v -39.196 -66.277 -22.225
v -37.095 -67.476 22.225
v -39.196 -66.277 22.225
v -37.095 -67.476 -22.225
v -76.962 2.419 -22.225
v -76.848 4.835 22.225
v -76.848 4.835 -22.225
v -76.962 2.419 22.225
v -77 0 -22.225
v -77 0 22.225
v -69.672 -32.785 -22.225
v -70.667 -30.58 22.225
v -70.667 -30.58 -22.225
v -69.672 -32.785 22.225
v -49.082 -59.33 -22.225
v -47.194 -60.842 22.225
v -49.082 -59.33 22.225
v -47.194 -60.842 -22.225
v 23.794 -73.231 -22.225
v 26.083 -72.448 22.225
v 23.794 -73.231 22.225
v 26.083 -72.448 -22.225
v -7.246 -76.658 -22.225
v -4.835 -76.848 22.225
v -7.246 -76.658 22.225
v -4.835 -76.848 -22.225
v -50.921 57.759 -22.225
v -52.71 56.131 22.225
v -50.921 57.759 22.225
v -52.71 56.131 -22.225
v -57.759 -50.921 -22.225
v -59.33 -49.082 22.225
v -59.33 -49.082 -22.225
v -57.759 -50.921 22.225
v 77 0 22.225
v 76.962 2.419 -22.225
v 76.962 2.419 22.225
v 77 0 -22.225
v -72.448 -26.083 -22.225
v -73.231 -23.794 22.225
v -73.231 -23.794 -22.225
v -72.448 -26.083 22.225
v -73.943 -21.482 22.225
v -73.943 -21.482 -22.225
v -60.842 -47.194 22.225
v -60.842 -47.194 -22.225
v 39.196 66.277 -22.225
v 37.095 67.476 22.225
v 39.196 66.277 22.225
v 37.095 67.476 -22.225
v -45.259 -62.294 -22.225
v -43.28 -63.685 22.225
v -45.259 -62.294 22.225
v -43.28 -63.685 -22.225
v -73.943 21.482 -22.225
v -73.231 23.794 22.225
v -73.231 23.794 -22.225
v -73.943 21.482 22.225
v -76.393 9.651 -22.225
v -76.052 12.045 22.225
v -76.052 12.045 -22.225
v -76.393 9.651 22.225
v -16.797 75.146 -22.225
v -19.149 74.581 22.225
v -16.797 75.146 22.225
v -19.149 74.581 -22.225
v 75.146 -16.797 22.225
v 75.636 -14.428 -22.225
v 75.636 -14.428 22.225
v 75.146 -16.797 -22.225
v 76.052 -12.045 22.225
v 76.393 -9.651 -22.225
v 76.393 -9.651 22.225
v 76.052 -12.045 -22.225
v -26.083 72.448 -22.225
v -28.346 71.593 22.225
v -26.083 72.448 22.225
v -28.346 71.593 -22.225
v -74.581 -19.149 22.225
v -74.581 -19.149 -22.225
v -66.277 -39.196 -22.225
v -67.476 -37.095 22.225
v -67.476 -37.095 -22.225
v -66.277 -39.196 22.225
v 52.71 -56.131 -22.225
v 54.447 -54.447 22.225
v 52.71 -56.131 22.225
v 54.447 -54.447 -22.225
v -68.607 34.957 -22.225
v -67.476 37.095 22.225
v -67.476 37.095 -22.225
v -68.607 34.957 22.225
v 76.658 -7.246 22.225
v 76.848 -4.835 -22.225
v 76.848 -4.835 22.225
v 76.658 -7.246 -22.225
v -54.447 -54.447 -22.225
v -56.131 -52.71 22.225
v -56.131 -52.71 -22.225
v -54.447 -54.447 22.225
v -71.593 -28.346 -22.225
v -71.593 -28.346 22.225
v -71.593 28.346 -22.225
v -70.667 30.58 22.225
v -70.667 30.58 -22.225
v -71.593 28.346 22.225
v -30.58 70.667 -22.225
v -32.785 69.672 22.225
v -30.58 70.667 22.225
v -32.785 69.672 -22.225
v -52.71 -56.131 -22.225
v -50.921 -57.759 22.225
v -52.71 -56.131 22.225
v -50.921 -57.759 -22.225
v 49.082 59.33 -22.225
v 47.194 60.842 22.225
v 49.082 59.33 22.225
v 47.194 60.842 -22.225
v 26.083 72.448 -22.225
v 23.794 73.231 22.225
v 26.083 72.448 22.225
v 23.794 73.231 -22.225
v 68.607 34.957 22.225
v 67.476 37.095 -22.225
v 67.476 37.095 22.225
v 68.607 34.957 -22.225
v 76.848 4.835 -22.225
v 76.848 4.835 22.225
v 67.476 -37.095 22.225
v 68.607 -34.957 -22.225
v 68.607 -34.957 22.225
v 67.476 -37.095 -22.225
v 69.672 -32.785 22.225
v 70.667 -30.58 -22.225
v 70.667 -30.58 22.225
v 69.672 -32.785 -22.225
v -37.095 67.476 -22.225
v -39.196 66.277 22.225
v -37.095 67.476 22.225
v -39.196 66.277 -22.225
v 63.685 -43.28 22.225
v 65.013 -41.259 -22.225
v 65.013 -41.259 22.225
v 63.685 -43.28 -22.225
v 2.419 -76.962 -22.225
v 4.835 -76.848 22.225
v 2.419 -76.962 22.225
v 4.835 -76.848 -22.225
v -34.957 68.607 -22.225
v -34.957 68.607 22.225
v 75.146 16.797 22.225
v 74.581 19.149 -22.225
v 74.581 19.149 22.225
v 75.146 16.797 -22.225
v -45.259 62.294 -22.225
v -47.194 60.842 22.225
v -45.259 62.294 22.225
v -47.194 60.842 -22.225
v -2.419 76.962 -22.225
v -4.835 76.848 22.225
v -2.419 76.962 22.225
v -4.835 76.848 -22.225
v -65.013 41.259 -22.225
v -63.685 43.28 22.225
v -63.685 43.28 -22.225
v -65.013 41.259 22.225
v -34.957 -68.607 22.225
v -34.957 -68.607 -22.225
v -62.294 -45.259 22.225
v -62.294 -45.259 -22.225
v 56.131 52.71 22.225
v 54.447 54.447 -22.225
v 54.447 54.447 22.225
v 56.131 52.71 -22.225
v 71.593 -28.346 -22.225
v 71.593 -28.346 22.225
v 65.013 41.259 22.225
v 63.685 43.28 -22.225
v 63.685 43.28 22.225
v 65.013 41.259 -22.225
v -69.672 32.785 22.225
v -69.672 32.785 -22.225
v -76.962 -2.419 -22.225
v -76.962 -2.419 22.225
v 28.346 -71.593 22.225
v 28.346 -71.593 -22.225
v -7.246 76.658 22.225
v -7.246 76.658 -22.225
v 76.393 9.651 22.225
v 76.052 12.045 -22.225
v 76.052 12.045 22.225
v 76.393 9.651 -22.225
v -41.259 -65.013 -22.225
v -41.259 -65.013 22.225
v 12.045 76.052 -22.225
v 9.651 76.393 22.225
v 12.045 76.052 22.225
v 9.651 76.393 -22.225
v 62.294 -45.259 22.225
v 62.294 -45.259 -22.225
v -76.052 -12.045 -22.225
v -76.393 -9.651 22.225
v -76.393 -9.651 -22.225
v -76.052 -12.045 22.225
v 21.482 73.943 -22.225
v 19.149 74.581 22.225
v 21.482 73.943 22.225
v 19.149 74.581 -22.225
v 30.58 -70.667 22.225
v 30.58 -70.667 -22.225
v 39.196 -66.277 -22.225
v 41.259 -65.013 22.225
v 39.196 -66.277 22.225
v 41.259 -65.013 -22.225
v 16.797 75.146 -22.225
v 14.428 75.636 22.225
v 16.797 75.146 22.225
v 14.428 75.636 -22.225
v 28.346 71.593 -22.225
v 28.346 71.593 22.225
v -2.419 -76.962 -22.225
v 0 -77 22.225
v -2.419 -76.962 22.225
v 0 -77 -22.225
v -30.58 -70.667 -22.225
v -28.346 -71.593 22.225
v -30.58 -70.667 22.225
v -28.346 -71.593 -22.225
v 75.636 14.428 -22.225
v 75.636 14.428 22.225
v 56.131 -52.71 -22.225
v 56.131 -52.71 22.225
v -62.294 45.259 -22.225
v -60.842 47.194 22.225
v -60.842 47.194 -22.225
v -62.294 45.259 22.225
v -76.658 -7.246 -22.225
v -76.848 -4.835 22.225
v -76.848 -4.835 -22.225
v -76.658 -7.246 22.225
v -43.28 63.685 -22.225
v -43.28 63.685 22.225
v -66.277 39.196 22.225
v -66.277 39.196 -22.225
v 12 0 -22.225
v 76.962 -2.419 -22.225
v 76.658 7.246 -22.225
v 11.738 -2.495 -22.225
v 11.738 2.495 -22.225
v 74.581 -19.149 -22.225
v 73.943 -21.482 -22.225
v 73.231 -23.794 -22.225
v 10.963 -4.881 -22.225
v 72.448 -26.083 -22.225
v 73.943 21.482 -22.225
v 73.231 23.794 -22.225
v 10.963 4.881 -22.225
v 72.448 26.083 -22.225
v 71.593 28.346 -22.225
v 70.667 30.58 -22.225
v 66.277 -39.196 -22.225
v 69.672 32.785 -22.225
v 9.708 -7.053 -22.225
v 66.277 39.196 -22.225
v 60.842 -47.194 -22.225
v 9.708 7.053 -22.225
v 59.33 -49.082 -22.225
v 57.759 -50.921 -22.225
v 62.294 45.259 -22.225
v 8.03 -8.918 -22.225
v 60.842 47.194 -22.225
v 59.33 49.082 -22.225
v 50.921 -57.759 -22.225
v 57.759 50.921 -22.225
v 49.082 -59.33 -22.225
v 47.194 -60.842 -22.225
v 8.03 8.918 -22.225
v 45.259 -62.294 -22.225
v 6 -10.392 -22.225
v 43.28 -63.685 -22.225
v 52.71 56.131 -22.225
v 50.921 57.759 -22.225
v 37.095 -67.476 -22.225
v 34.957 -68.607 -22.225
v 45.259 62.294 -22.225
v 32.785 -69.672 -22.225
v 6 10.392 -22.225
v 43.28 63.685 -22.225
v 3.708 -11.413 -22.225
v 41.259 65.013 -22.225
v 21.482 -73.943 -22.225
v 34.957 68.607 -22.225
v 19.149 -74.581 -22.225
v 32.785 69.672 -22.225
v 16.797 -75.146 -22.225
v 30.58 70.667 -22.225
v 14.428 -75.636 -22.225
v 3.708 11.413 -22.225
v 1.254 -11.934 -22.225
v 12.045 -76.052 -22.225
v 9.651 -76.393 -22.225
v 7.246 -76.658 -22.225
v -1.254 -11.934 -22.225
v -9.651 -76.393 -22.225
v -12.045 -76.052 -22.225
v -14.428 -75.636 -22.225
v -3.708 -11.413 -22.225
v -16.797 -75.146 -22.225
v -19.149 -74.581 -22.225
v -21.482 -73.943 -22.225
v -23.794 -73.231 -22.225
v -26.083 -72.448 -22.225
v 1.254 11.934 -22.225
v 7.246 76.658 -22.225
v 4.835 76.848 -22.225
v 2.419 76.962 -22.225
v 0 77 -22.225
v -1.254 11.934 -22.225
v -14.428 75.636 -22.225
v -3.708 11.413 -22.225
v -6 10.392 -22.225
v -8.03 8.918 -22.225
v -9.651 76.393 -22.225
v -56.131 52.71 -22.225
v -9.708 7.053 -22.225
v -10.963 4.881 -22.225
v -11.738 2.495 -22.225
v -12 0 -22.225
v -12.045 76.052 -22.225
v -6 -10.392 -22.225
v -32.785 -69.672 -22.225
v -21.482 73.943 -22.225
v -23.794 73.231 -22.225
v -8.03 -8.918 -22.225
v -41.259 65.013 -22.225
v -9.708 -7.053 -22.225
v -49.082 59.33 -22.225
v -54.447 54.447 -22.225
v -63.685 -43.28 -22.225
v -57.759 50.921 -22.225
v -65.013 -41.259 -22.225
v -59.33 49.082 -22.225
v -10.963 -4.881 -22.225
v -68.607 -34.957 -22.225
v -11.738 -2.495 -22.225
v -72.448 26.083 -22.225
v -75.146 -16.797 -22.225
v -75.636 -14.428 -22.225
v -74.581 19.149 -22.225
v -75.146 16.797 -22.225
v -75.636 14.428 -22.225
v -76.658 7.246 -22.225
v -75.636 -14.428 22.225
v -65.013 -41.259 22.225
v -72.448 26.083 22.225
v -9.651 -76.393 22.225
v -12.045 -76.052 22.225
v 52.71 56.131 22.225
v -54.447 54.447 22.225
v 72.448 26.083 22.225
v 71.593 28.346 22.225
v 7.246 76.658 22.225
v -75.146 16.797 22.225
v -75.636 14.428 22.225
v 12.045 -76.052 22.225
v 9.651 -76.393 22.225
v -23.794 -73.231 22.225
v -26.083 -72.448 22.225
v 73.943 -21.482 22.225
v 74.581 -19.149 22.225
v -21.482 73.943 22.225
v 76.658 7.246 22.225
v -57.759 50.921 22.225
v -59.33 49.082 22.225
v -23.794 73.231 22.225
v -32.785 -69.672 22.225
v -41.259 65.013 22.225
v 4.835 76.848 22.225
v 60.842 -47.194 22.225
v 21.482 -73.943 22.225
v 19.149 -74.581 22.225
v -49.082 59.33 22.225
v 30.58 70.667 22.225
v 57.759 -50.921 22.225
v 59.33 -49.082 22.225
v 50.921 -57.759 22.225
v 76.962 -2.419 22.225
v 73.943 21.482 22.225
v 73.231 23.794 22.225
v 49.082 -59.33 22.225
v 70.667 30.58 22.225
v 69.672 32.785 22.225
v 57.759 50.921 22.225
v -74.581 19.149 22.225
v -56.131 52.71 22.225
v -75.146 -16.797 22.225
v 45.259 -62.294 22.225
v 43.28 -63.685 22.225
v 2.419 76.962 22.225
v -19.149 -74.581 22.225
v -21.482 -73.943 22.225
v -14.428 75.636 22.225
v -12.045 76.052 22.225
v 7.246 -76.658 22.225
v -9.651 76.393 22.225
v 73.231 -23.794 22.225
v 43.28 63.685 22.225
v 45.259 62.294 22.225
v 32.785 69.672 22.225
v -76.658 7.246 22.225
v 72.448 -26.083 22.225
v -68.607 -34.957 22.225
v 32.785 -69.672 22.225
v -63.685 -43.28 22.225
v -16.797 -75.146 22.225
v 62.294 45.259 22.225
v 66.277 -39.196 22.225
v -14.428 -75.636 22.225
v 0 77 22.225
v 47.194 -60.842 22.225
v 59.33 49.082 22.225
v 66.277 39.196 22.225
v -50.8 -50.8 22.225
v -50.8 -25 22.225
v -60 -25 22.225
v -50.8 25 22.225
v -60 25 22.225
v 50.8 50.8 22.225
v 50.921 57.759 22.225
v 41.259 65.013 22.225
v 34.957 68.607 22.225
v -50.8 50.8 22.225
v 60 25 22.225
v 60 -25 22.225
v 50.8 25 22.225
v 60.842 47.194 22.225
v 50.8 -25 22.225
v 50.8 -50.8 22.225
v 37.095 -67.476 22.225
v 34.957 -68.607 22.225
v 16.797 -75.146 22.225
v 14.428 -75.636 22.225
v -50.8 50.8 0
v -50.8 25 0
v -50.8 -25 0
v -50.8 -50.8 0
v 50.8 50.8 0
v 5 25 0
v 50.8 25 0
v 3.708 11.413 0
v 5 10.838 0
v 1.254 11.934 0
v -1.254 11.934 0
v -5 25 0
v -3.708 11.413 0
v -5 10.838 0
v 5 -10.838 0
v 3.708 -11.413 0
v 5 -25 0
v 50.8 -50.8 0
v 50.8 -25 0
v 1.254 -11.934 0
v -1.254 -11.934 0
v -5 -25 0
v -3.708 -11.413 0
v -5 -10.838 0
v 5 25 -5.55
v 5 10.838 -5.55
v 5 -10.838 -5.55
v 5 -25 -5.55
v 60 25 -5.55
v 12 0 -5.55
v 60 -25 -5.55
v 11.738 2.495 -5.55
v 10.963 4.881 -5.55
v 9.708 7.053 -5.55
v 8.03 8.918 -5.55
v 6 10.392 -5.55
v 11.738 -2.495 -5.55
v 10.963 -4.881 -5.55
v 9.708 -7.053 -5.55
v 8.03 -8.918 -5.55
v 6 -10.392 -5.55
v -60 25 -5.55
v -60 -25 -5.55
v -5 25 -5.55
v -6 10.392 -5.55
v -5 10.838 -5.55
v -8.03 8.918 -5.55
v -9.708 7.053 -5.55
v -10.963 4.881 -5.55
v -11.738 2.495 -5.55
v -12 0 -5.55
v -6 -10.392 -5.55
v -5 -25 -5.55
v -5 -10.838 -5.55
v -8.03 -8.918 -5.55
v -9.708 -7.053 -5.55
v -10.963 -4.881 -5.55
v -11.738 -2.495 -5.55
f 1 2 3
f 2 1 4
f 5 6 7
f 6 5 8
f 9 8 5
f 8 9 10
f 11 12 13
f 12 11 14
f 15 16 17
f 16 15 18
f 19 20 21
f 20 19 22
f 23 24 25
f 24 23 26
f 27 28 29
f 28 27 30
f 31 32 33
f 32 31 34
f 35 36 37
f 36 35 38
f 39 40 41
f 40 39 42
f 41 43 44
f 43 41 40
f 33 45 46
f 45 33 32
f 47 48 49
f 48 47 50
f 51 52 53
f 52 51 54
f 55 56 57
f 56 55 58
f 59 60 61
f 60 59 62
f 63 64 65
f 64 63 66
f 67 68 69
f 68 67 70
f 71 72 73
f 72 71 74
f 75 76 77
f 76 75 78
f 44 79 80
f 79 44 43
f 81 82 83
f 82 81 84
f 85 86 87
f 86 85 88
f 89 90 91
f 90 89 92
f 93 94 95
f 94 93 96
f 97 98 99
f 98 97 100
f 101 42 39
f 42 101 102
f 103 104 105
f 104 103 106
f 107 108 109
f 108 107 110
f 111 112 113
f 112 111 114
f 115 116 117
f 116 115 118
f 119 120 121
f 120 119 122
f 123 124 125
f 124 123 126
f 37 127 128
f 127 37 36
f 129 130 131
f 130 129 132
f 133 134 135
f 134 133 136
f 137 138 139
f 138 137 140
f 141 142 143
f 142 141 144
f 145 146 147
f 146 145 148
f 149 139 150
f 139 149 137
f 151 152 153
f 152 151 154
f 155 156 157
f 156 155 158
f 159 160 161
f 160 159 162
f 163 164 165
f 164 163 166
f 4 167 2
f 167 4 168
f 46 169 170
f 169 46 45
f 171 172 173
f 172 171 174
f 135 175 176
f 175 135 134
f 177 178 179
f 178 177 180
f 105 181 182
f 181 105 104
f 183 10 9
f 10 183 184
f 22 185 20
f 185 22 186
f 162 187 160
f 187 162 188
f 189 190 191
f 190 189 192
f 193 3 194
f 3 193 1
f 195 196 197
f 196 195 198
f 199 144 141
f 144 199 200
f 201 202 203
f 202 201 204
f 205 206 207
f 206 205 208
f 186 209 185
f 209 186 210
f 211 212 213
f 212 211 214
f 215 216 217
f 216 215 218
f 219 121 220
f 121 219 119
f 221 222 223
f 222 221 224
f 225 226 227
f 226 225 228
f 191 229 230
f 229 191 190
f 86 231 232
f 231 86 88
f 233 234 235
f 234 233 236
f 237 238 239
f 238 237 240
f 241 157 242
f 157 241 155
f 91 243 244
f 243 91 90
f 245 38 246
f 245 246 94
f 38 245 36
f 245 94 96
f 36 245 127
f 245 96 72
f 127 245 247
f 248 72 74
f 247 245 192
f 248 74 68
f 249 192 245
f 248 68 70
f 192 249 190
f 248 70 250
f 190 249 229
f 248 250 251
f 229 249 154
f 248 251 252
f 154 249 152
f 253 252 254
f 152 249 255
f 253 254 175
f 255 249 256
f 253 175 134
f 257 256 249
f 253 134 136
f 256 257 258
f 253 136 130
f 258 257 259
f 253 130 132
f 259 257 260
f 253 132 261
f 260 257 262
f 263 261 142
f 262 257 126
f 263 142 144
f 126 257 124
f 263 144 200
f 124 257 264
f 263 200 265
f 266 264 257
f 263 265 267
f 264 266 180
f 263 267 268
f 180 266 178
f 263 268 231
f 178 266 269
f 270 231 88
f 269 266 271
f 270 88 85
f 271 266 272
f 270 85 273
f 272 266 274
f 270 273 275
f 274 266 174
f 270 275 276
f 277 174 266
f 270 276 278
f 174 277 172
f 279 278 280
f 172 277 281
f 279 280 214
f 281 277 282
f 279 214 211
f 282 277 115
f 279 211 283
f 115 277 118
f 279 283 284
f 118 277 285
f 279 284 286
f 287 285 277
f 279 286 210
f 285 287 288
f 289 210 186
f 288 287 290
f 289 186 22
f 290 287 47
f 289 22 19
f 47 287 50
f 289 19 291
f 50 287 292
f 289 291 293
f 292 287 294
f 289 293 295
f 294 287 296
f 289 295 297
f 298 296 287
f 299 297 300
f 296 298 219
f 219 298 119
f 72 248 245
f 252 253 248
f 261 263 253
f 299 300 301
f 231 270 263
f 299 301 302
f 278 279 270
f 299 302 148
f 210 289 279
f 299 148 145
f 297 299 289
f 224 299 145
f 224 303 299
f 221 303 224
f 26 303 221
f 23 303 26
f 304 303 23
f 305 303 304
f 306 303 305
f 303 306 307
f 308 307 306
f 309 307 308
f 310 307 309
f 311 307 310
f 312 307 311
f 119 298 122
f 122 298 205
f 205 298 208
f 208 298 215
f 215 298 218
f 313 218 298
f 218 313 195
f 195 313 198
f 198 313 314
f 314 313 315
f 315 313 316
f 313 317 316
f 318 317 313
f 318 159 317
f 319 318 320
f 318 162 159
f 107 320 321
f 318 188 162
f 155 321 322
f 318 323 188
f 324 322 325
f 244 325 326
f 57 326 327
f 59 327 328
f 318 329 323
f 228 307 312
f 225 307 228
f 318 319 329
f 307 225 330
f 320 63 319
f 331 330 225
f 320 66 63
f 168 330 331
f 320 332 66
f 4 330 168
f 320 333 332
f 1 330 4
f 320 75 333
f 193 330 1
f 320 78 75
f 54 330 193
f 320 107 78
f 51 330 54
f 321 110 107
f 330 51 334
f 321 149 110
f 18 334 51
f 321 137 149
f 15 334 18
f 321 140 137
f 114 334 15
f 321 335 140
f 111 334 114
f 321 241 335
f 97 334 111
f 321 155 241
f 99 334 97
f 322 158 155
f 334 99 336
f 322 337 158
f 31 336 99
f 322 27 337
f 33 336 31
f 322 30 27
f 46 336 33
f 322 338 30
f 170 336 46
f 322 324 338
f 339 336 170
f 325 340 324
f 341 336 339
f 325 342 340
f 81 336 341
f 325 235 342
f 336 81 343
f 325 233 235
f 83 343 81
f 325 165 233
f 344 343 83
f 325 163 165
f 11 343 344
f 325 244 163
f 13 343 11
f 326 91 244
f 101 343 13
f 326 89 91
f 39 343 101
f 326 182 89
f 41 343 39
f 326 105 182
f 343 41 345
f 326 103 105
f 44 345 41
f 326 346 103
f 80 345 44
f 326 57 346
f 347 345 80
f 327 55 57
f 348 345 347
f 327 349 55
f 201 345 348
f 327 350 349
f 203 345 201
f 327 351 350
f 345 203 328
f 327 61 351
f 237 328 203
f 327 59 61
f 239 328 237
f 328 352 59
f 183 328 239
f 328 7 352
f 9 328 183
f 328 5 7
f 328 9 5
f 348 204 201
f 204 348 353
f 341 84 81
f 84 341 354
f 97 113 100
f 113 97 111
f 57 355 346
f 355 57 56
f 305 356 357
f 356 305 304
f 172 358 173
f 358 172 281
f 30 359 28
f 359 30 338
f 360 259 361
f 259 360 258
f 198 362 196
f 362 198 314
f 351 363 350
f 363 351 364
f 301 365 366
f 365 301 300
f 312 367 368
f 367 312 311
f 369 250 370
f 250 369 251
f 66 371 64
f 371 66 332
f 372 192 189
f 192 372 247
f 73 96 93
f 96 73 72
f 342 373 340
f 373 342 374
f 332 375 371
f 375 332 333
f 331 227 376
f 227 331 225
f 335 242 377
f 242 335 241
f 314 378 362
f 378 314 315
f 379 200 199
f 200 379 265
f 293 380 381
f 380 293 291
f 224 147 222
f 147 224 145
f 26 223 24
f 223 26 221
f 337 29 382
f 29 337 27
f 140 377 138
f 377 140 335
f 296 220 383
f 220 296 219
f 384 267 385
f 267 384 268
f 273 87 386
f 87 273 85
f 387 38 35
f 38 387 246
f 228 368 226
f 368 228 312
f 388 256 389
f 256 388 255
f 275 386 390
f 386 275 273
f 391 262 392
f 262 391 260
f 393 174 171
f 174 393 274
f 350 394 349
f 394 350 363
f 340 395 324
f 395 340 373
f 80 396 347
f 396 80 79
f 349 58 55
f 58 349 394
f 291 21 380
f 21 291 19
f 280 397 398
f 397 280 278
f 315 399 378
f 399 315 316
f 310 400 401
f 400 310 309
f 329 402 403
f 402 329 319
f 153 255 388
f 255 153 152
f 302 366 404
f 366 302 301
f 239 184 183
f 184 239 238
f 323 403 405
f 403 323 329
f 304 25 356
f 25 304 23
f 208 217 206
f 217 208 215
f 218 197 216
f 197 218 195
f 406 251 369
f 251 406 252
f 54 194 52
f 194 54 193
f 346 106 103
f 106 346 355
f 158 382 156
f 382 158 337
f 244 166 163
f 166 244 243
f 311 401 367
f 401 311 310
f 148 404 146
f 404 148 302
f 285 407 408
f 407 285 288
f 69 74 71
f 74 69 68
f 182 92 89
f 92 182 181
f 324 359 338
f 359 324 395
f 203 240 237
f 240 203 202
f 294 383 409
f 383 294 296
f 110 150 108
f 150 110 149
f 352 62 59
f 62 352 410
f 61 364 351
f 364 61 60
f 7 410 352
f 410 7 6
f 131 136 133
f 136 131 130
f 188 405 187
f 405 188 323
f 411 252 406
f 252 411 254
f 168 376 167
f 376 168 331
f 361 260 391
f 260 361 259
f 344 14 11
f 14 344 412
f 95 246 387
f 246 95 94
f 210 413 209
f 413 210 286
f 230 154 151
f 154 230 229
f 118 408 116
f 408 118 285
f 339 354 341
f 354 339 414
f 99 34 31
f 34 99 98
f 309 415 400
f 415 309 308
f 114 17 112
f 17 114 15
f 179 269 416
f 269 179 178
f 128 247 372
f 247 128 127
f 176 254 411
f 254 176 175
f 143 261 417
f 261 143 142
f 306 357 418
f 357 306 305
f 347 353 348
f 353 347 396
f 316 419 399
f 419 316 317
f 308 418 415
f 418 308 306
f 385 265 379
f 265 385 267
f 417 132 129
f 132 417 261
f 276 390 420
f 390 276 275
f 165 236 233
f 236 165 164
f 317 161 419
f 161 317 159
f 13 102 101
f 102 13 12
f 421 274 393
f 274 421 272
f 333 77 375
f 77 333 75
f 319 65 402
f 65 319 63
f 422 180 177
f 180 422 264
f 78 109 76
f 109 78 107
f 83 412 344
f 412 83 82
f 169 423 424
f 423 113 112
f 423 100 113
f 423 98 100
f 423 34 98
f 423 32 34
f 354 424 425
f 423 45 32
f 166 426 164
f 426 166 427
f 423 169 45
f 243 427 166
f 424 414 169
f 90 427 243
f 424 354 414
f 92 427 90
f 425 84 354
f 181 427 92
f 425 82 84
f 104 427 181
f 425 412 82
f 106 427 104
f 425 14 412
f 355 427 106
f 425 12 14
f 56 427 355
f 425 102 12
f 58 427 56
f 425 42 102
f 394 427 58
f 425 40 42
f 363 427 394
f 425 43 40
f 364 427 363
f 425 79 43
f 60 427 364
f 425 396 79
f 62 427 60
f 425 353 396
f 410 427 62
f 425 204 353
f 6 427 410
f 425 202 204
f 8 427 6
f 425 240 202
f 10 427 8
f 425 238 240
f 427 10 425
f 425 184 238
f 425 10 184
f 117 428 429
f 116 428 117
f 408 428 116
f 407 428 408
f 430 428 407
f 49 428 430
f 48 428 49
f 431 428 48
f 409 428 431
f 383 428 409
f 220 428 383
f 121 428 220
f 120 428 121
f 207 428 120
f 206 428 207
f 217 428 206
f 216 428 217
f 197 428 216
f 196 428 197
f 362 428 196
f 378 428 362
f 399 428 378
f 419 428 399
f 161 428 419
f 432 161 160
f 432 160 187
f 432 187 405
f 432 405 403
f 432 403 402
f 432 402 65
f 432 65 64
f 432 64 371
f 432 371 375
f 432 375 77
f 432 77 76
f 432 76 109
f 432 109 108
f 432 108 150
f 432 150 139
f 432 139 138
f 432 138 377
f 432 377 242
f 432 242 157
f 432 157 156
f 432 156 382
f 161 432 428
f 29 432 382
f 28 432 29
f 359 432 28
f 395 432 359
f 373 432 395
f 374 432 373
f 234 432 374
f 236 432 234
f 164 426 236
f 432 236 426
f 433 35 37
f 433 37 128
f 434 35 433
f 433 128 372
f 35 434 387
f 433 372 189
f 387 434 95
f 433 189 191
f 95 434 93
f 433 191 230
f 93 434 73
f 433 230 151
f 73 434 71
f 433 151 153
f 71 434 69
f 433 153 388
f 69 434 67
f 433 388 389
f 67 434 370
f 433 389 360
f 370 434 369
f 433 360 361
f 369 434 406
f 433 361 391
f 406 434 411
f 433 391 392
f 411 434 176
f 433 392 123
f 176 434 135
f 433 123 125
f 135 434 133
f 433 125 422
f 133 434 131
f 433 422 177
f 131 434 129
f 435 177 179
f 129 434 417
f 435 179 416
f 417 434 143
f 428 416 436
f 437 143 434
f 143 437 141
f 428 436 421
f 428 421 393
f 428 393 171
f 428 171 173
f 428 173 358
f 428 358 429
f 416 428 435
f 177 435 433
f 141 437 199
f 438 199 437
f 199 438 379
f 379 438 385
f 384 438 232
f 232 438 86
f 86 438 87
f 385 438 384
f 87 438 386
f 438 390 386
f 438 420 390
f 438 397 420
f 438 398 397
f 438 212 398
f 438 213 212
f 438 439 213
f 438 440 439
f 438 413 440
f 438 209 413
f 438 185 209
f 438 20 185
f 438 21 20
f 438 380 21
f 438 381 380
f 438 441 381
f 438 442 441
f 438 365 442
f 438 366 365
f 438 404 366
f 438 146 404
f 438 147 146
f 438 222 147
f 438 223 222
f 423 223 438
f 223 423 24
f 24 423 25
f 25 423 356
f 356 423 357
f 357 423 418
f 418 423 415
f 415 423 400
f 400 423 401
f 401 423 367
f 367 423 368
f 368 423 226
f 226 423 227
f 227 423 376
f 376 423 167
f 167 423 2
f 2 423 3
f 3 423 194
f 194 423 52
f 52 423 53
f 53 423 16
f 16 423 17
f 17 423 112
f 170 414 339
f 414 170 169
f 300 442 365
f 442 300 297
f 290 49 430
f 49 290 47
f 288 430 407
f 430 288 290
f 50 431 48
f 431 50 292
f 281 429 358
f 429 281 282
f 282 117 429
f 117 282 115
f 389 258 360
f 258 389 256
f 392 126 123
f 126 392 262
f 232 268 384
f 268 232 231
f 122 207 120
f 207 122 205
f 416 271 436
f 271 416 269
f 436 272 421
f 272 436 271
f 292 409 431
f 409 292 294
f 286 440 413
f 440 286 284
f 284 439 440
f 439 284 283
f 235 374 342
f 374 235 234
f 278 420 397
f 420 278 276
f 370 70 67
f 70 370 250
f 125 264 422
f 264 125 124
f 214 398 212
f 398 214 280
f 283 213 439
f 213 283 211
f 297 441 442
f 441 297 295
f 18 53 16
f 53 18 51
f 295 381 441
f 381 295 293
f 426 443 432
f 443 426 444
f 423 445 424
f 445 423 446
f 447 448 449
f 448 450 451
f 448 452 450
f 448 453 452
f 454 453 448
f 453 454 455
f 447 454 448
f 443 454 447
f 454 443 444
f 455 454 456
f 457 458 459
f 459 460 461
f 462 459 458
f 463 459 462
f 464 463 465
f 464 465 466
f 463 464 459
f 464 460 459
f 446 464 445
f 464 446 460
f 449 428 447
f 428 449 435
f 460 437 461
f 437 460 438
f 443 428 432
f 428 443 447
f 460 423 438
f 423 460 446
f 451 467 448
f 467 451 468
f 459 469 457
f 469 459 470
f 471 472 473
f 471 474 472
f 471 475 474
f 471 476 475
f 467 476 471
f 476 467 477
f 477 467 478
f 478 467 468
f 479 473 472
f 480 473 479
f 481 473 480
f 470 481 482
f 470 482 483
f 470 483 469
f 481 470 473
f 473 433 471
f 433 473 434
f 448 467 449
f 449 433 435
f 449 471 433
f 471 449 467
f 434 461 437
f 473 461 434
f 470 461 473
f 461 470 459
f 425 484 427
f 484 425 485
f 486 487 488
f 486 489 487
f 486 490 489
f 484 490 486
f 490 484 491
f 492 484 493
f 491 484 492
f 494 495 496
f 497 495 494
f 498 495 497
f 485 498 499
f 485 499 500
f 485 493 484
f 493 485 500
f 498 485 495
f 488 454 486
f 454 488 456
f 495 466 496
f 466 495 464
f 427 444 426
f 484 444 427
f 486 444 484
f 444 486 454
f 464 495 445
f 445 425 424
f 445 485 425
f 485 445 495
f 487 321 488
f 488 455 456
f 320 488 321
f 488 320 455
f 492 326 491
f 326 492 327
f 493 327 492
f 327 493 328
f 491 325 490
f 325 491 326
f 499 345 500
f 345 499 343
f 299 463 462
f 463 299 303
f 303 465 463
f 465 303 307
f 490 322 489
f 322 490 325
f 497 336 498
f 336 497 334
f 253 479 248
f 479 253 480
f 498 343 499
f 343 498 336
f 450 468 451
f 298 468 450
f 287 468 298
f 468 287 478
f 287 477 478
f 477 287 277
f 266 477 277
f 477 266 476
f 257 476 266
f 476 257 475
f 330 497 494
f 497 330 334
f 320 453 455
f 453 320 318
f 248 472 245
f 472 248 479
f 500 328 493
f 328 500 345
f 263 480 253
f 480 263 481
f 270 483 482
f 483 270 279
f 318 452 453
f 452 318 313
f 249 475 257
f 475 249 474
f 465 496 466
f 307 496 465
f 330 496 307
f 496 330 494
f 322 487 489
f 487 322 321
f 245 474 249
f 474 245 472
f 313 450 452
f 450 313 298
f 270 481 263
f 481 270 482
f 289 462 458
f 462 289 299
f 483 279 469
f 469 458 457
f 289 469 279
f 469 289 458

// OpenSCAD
//main body
rotate([0, 180, 0])
difference(){
    cylinder(r = 77, h = 44.45, $fn = 200, center = true);
    //cylinder(44.45,77,77,true);
    // square hole in middle
    translate([0,0,-22.225])
        cube([101.6,101.6,44.45], true);
    //square extension L
    translate([-60, -25, -44.45])
    cube([55,50,50], false);
    //square extension R
    translate([5, -25, -44.45])
        cube([55,50,50], false);
    /*space for motor cord right
    translate([5, -20, -44.45])
        cube([5,40, 88.9], false);
    //space for motor cord left
    translate([-10, -20, -44.45])
        cube([5,40, 88.9], false);*/
    //another hole in the middle
    //cube([70,50,45], true);
    /*hole 1 in corner
    translate([-38, -38, 0])
        cylinder(500, 12, 12, true);
    //hole 2 in corner
    translate([-38, 38, 0])
        cylinder(500, 12, 12, true);
    //hole 3 in corner
    translate([38, -38, 0])
        cylinder(500, 12, 12, true);
    //hole 4 in corner
    translate([38, 38, 0])
        cylinder(500, 12, 12, true);*/
    //hole in center
    translate([0, 0, 0])
        cylinder(500, 12, 12, true);
}
/*
//center motor mounter
translate([-5, -10, -22.225])
    cube([10, 20, 30], false);
main motor left
rotate([0,90,0])
    translate([15, 0, -25.45])
cylinder(40.9, 8, 8, true);
//main motor right
rotate([0,90,0])
    translate([15, 0, 25.45])
cylinder(40.9, 8, 8, true);
/*motor turnything left
rotate([90,0,0])
    translate([0,-75, -185]) 
    cylinder(40, 10, 10, $fn=6, true);
//motor turnything right
rotate([90,0,0])
    translate([0,-75, 185]) 
    cylinder(40, 10, 10, $fn=6, true);
//wheel left
rotate([0, 90, 0])
    translate([15, 0, -51])
    cylinder(11.303, 19.05, 19.05, true);
//wheel left
rotate([0, 90, 0])
    translate([15, 0, 51])
    cylinder(11.303, 19.05, 19.05, true);
//caster
rotate([0, 90, 0])
    translate([15, 31, 0])
    cylinder(11.303, 19.05, 19.05, true);
//controller
    translate([0,0,44.45])
        cube([101.6,101.6,44.45], true);
//ir sensor FL
rotate([0,0,45])
translate([-5, 75, 20])
    cube([20, 5, 40], true);
//ir sensor FR
rotate([0,0,-45])
translate([5, 75, 20])
    cube([20, 5, 40], true);
//ir sensor F
translate([0, 75, 20])
    cube([20, 5, 40], true);
//ir sensor L
rotate([0, 0, 90])
    translate([0, 75, 20])
        cube([20, 5, 40], true);
//ir sensor R
rotate([0, 0, 90])
    translate([0, -75, 20])
        cube([20, 5, 40], true);*/
